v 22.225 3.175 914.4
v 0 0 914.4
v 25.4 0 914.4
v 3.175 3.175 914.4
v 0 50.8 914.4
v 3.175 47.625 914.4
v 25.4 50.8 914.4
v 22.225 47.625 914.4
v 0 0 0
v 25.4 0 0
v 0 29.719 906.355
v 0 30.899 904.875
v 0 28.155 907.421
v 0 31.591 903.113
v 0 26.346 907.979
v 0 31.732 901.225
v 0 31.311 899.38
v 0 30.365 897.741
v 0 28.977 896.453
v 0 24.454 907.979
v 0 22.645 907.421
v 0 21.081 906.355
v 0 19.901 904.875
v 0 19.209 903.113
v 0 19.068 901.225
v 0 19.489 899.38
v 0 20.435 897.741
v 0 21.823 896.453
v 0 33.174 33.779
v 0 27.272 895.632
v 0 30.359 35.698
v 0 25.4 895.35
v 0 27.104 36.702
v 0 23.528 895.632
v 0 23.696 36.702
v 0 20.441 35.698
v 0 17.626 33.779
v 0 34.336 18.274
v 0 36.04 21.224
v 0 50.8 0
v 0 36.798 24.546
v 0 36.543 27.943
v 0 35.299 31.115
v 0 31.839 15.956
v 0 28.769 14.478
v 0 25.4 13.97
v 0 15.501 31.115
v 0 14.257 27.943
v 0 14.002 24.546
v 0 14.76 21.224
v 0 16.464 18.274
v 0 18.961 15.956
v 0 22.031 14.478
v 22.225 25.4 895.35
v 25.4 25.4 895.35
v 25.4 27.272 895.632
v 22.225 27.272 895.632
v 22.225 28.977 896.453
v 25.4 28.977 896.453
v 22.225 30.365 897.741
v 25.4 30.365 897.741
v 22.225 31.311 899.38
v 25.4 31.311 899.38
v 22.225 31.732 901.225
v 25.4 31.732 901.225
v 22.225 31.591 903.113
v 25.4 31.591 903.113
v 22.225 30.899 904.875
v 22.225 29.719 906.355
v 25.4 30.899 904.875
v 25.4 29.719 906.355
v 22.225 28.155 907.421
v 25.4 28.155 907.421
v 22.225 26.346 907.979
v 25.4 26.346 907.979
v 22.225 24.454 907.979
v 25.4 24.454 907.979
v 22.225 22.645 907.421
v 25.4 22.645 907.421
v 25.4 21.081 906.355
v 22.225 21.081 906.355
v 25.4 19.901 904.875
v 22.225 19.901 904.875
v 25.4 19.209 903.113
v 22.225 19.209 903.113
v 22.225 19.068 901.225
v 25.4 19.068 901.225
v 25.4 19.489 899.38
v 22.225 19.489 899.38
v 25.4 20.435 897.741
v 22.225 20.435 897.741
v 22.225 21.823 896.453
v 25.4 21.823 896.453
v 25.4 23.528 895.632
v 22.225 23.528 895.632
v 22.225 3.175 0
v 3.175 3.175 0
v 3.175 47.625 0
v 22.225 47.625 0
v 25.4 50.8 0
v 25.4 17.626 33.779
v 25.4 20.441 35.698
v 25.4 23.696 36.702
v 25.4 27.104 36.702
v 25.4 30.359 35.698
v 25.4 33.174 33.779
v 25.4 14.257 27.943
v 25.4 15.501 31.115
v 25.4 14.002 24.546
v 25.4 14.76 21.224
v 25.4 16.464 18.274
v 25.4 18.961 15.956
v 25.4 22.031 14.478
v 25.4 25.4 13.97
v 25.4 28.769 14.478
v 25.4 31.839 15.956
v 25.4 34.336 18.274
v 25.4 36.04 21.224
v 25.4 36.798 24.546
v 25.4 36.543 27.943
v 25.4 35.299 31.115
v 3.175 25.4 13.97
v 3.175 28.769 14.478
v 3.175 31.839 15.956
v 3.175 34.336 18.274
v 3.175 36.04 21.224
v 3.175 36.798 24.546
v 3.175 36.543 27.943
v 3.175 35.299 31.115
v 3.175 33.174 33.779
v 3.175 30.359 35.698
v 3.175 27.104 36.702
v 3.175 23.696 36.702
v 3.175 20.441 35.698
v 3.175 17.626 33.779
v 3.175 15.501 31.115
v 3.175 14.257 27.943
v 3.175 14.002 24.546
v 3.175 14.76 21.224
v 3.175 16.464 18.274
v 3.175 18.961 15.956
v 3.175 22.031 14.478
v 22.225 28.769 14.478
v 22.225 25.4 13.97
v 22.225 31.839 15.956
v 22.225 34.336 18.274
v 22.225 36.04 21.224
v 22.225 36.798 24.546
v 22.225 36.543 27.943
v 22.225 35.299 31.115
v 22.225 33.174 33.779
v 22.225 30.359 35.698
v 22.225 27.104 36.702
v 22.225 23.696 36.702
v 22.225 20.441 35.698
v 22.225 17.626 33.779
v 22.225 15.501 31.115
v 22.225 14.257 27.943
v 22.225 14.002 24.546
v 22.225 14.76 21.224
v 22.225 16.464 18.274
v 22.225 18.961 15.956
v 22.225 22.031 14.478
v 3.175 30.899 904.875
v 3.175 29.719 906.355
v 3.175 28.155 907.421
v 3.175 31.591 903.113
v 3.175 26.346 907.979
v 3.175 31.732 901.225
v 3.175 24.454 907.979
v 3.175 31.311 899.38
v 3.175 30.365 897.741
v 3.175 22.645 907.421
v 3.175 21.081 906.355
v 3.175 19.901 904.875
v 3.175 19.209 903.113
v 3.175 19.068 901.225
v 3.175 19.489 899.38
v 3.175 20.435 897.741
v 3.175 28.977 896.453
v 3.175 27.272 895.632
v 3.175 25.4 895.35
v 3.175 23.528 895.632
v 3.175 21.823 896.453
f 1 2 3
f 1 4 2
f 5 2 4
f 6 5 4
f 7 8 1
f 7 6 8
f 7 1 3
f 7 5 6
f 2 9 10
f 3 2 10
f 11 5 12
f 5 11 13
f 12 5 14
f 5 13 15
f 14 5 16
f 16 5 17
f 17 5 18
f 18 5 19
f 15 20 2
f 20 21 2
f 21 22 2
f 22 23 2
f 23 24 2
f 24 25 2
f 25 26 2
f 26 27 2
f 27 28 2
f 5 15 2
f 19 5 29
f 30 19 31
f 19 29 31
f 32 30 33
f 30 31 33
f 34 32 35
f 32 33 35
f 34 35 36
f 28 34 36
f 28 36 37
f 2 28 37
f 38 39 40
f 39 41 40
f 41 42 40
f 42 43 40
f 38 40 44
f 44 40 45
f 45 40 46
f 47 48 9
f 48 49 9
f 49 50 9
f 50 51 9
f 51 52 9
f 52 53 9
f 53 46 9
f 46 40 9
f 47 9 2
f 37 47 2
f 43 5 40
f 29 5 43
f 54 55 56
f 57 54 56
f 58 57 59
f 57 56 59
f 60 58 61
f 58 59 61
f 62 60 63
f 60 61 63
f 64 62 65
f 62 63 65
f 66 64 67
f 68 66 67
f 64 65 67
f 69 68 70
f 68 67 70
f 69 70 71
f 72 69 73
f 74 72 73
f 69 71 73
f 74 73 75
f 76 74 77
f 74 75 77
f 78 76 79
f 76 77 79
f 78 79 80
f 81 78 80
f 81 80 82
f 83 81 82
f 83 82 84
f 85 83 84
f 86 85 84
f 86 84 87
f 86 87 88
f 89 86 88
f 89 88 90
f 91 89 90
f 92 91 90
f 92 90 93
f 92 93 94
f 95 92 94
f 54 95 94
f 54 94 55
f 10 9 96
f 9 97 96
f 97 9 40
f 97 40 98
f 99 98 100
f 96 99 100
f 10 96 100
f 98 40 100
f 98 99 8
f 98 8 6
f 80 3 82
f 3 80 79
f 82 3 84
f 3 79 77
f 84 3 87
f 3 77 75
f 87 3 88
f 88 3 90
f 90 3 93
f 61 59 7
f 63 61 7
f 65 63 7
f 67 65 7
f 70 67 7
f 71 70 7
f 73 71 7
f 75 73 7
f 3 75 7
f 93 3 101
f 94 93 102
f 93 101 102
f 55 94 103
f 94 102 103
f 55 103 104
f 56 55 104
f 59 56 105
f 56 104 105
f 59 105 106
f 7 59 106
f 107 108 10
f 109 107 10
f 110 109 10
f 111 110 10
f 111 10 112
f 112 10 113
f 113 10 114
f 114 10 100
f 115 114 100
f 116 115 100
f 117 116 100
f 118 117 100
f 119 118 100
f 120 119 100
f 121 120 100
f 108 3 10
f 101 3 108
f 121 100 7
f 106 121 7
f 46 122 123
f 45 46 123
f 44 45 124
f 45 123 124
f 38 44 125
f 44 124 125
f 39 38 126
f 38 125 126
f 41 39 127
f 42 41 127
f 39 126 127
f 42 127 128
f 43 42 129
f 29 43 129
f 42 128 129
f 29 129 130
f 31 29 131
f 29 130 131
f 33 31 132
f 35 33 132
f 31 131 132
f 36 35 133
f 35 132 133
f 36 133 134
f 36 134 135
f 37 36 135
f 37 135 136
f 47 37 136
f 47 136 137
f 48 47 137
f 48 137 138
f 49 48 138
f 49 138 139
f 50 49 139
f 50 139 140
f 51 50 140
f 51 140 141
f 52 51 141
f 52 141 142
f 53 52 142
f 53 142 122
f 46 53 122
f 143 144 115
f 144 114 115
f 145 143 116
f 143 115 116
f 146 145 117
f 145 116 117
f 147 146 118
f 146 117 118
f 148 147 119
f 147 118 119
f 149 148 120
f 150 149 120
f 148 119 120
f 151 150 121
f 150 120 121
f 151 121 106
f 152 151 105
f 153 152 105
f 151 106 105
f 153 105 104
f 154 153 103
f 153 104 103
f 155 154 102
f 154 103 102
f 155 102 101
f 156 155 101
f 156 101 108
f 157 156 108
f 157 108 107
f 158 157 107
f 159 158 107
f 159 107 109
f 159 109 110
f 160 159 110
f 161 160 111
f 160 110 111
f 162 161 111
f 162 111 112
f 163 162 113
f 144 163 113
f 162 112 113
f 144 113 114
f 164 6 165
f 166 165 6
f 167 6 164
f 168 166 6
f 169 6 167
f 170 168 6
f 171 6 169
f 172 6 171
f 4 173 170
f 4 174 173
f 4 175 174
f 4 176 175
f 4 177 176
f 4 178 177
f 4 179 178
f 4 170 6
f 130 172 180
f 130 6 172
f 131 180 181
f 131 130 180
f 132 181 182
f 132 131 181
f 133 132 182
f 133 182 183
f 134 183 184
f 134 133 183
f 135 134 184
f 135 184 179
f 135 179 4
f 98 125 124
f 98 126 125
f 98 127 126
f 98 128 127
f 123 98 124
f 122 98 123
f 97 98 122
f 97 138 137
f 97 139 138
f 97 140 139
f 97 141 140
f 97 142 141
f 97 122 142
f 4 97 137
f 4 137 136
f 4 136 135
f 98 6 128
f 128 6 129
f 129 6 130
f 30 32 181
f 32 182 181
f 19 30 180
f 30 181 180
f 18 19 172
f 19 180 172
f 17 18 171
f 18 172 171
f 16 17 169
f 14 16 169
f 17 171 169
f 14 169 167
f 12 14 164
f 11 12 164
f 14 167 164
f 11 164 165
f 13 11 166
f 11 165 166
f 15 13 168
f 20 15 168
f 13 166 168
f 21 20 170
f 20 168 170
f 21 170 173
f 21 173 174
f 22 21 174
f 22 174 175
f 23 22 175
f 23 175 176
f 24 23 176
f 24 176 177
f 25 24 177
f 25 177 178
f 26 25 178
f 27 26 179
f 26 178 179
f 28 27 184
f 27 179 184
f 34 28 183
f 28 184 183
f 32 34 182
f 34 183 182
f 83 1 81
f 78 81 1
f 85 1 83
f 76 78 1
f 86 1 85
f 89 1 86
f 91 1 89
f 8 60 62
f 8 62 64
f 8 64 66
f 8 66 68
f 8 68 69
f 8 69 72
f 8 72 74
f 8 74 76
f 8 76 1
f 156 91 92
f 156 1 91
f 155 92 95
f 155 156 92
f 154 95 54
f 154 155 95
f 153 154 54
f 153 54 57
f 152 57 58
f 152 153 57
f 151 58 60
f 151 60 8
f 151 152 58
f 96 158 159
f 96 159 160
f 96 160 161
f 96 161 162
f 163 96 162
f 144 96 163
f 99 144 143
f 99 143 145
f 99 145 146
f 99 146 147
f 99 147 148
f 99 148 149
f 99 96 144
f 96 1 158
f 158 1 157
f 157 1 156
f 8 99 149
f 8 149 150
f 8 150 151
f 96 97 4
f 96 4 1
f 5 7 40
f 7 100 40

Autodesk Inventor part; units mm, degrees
ref_plane "YZ Plane" through (0, 0, 0) normal (1, 0, 0) x (0, 1, 0)
ref_plane "XZ Plane" through (0, 0, 0) normal (0, 1, 0) x (-1, 0, 0)
ref_plane "XY Plane" through (0, 0, 0) normal (0, 0, 1) x (1, 0, 0)
sketch "Sketch1" plane through (0, 0, 0) normal (0, 0, 1) x (1, 0, 0)
  line L0 (0, 0) -> (25.4, 0)
  line L1 (25.4, 0) -> (25.4, 50.8)
  line L2 (25.4, 50.8) -> (0, 50.8)
  line L3 (0, 50.8) -> (0, 0)
  dimension "d0" = 25.4
  dimension "d1" = 50.8
extrude "Extrusion1" add sketch "Sketch1" along normal blind 914.4
shell "Shell1" thickness 3.175 removed faces 2 at (8.4667, 16.9333, 0) at (8.4667, 16.9333, 914.4)
sketch "Sketch2" plane through (25.4, 0, 0) normal (1, 0, 0) x (0, 0, -1)
  circle A0 centre (-25.4, 25.4) radius 11.43
  line L0 (0, 50.8) -> (-914.4, 50.8) projected
  line L1 (0, 0) -> (0, 50.8) projected
  circle A1 centre (-901.7, 25.4) radius 6.35
  line L2 (-914.4, 0) -> (-914.4, 50.8) projected
  dimension "d5" = 22.86
  dimension "d6" = 25.4
  dimension "d7" = 25.4
  dimension "d10" = 12.7
  dimension "d11" = 25.4
  dimension "d12" = 12.7
extrude "Extrusion2" cut sketch "Sketch2" against normal blind 25.4
properties part number "Kermit Frame 17"
